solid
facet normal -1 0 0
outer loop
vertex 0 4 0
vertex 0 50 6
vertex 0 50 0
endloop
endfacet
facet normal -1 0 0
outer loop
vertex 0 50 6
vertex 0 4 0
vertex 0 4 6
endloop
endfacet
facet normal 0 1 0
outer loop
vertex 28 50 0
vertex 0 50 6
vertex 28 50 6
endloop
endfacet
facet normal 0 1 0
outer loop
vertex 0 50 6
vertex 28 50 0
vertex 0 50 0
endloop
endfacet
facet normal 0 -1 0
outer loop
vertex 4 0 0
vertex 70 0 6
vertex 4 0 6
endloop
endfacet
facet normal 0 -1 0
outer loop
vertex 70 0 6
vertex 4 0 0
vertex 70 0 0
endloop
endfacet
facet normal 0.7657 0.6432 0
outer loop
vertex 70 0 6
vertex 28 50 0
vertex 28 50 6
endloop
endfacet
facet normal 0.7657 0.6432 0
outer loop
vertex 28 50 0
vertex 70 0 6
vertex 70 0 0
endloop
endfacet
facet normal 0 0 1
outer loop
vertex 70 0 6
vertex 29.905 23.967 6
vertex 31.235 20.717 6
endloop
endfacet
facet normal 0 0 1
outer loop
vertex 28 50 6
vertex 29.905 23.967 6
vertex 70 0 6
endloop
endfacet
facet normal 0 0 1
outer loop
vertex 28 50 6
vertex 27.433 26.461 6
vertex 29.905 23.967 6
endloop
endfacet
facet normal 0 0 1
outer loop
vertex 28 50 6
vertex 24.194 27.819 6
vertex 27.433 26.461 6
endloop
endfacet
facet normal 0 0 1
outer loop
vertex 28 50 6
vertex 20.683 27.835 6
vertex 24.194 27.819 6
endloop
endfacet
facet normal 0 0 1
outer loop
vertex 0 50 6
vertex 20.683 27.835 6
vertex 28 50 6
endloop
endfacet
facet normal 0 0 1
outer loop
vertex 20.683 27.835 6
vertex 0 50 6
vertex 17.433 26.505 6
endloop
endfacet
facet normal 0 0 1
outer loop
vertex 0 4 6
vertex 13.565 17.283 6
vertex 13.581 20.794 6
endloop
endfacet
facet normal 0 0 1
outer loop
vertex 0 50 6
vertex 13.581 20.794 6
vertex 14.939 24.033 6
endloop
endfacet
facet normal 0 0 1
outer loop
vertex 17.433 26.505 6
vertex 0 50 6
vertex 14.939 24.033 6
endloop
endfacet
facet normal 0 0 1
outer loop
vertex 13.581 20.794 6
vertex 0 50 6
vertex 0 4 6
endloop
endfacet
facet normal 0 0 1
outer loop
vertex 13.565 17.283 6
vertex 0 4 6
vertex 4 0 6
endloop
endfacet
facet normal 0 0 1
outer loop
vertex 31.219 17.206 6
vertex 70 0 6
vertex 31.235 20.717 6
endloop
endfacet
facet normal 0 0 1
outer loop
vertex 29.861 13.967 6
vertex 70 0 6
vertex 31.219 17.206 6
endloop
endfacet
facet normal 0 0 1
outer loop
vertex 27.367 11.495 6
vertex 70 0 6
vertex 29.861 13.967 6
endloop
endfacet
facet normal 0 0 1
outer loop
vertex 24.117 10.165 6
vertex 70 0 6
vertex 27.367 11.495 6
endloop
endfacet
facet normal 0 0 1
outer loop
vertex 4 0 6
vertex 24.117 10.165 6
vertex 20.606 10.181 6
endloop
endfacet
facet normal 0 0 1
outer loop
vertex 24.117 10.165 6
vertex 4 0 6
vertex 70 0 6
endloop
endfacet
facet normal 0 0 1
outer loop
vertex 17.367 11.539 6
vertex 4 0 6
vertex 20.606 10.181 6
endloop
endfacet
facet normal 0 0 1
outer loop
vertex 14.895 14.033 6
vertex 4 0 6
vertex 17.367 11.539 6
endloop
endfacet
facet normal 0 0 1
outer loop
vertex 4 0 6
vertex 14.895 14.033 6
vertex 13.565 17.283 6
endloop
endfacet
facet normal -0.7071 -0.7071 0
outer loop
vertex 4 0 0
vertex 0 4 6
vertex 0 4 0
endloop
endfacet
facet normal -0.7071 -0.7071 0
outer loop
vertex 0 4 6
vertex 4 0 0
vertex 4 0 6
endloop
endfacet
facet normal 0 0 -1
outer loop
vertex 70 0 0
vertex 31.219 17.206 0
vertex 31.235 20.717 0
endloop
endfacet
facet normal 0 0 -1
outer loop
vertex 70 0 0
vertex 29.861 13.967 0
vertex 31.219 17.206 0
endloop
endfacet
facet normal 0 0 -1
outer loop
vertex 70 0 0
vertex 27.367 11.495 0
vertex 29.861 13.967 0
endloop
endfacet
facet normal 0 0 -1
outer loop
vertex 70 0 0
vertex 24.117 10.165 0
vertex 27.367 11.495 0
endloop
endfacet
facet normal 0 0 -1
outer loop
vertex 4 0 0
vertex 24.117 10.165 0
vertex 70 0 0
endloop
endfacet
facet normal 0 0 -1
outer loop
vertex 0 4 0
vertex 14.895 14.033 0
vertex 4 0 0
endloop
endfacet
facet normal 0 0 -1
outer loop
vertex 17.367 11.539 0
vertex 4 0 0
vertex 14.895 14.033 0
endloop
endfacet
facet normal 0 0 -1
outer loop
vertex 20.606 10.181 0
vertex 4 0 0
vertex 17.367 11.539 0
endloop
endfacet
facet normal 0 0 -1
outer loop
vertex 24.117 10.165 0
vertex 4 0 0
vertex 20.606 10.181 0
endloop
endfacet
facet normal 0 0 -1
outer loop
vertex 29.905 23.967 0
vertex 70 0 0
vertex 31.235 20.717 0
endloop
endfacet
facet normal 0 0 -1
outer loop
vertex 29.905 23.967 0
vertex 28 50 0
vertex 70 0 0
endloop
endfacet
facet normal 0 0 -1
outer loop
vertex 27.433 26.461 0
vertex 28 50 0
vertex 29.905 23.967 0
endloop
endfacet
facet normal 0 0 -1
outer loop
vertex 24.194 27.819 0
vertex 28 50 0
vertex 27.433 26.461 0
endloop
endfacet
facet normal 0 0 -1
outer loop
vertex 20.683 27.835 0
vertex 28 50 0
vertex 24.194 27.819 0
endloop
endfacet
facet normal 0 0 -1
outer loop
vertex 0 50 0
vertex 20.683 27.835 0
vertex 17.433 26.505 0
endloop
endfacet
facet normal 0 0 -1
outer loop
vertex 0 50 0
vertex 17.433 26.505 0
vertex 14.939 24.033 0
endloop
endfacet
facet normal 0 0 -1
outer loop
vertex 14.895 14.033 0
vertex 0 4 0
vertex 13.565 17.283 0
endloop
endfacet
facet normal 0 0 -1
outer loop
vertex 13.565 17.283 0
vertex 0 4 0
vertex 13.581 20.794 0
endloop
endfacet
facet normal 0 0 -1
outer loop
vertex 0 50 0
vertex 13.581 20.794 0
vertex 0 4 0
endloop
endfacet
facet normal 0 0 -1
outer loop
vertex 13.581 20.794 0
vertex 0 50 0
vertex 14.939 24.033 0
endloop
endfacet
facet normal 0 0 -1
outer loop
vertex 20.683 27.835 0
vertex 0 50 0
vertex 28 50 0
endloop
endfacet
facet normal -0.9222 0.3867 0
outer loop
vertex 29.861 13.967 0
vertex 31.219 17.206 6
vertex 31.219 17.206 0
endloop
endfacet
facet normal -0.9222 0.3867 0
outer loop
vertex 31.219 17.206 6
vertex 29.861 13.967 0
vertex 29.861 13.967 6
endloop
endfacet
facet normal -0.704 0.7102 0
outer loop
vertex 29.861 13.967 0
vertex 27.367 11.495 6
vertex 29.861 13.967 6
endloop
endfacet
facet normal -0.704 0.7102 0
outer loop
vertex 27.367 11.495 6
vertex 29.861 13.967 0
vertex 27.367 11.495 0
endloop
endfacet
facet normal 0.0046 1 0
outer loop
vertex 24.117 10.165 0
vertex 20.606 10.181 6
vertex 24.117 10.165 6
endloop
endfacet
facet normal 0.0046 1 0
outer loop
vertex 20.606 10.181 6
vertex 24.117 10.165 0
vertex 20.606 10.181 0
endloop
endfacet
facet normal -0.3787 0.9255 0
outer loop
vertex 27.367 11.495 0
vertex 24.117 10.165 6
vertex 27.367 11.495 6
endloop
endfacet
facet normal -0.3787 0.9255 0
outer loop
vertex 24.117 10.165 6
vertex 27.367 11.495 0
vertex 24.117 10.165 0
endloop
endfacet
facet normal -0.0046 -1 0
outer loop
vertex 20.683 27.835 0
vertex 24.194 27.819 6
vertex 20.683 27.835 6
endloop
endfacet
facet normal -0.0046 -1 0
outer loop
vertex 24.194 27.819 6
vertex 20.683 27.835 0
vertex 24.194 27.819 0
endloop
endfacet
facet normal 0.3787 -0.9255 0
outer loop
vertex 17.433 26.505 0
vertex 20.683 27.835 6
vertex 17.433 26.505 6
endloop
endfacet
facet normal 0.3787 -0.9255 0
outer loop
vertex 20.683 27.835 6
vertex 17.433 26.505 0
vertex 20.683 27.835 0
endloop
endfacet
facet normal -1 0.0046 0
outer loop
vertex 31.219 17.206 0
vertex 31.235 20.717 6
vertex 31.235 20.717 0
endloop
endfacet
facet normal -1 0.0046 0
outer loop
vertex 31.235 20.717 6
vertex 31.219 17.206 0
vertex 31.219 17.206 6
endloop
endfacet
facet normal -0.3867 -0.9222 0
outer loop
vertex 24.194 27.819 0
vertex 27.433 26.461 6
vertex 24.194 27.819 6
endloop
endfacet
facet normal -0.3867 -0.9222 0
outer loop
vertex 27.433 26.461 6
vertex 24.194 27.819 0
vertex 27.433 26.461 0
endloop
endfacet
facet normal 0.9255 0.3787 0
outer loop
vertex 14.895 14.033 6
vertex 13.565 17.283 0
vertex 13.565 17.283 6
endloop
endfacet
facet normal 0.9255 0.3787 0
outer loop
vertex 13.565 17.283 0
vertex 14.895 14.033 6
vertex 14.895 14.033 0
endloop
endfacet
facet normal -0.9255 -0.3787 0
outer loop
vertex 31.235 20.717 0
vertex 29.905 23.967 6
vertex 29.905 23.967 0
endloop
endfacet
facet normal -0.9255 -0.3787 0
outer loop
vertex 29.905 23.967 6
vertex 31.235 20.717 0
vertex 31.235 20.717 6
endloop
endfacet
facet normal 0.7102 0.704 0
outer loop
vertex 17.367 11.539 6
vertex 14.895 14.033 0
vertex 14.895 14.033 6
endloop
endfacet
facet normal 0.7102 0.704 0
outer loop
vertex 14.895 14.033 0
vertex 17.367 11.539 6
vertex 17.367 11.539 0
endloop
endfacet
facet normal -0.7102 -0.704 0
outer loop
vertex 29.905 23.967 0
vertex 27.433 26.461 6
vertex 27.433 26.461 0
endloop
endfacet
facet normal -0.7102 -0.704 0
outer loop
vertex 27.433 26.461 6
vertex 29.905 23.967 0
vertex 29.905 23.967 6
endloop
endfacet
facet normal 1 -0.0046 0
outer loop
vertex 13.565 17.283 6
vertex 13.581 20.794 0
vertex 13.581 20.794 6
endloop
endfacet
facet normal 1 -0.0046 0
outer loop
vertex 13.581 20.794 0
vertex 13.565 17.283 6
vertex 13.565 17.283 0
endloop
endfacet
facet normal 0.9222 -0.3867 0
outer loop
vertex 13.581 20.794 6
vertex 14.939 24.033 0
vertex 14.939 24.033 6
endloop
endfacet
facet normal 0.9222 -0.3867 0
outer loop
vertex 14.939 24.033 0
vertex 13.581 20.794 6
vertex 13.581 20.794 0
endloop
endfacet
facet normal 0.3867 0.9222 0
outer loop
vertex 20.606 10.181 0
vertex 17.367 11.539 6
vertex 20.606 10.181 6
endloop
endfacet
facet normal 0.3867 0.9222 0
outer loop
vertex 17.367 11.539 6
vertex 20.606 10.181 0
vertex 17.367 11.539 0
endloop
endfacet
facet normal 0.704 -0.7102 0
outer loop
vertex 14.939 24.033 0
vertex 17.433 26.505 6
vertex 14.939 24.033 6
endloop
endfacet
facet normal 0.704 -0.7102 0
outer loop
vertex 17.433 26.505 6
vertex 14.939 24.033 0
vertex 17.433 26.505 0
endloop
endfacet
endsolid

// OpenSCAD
$fn = 32;

// ----------------------------------------------------------------------
// Bracket plate: gusset 70 x 50
// ----------------------------------------------------------------------

// --- parameters (mm) ---
hole_r = 3;               // bolt hole radius
plate_t = 6;              // plate thickness, Z (extrusion height)
gus_a = 70;               // base length
gus_b = 50;               // height
top_x = 28;               // top edge X of the angled cut
light_r = 9;              // lightening hole radius

light_d = 2 * light_r;

profile = [[4, 0], [35, 0], [70, 0], [28, 50], [0, 50], [0, 4]];  // primary outline, 6 points, counter clockwise
void_1 = [[31.235, 20.717], [29.905, 23.967], [27.433, 26.461], [24.194, 27.819], [20.683, 27.835], [17.433, 26.505], [14.939, 24.033], [13.581, 20.794], [13.565, 17.283], [14.895, 14.033], [17.367, 11.539], [20.606, 10.181], [24.117, 10.165], [27.367, 11.495], [29.861, 13.967], [31.219, 17.206]];  // lightening hole, 16 points

// --- the one profile operation ---
difference() {
  linear_extrude(height = plate_t) polygon(points = profile);
  translate([0, 0, -1])
    linear_extrude(height = plate_t + 2) polygon(points = void_1);
}
